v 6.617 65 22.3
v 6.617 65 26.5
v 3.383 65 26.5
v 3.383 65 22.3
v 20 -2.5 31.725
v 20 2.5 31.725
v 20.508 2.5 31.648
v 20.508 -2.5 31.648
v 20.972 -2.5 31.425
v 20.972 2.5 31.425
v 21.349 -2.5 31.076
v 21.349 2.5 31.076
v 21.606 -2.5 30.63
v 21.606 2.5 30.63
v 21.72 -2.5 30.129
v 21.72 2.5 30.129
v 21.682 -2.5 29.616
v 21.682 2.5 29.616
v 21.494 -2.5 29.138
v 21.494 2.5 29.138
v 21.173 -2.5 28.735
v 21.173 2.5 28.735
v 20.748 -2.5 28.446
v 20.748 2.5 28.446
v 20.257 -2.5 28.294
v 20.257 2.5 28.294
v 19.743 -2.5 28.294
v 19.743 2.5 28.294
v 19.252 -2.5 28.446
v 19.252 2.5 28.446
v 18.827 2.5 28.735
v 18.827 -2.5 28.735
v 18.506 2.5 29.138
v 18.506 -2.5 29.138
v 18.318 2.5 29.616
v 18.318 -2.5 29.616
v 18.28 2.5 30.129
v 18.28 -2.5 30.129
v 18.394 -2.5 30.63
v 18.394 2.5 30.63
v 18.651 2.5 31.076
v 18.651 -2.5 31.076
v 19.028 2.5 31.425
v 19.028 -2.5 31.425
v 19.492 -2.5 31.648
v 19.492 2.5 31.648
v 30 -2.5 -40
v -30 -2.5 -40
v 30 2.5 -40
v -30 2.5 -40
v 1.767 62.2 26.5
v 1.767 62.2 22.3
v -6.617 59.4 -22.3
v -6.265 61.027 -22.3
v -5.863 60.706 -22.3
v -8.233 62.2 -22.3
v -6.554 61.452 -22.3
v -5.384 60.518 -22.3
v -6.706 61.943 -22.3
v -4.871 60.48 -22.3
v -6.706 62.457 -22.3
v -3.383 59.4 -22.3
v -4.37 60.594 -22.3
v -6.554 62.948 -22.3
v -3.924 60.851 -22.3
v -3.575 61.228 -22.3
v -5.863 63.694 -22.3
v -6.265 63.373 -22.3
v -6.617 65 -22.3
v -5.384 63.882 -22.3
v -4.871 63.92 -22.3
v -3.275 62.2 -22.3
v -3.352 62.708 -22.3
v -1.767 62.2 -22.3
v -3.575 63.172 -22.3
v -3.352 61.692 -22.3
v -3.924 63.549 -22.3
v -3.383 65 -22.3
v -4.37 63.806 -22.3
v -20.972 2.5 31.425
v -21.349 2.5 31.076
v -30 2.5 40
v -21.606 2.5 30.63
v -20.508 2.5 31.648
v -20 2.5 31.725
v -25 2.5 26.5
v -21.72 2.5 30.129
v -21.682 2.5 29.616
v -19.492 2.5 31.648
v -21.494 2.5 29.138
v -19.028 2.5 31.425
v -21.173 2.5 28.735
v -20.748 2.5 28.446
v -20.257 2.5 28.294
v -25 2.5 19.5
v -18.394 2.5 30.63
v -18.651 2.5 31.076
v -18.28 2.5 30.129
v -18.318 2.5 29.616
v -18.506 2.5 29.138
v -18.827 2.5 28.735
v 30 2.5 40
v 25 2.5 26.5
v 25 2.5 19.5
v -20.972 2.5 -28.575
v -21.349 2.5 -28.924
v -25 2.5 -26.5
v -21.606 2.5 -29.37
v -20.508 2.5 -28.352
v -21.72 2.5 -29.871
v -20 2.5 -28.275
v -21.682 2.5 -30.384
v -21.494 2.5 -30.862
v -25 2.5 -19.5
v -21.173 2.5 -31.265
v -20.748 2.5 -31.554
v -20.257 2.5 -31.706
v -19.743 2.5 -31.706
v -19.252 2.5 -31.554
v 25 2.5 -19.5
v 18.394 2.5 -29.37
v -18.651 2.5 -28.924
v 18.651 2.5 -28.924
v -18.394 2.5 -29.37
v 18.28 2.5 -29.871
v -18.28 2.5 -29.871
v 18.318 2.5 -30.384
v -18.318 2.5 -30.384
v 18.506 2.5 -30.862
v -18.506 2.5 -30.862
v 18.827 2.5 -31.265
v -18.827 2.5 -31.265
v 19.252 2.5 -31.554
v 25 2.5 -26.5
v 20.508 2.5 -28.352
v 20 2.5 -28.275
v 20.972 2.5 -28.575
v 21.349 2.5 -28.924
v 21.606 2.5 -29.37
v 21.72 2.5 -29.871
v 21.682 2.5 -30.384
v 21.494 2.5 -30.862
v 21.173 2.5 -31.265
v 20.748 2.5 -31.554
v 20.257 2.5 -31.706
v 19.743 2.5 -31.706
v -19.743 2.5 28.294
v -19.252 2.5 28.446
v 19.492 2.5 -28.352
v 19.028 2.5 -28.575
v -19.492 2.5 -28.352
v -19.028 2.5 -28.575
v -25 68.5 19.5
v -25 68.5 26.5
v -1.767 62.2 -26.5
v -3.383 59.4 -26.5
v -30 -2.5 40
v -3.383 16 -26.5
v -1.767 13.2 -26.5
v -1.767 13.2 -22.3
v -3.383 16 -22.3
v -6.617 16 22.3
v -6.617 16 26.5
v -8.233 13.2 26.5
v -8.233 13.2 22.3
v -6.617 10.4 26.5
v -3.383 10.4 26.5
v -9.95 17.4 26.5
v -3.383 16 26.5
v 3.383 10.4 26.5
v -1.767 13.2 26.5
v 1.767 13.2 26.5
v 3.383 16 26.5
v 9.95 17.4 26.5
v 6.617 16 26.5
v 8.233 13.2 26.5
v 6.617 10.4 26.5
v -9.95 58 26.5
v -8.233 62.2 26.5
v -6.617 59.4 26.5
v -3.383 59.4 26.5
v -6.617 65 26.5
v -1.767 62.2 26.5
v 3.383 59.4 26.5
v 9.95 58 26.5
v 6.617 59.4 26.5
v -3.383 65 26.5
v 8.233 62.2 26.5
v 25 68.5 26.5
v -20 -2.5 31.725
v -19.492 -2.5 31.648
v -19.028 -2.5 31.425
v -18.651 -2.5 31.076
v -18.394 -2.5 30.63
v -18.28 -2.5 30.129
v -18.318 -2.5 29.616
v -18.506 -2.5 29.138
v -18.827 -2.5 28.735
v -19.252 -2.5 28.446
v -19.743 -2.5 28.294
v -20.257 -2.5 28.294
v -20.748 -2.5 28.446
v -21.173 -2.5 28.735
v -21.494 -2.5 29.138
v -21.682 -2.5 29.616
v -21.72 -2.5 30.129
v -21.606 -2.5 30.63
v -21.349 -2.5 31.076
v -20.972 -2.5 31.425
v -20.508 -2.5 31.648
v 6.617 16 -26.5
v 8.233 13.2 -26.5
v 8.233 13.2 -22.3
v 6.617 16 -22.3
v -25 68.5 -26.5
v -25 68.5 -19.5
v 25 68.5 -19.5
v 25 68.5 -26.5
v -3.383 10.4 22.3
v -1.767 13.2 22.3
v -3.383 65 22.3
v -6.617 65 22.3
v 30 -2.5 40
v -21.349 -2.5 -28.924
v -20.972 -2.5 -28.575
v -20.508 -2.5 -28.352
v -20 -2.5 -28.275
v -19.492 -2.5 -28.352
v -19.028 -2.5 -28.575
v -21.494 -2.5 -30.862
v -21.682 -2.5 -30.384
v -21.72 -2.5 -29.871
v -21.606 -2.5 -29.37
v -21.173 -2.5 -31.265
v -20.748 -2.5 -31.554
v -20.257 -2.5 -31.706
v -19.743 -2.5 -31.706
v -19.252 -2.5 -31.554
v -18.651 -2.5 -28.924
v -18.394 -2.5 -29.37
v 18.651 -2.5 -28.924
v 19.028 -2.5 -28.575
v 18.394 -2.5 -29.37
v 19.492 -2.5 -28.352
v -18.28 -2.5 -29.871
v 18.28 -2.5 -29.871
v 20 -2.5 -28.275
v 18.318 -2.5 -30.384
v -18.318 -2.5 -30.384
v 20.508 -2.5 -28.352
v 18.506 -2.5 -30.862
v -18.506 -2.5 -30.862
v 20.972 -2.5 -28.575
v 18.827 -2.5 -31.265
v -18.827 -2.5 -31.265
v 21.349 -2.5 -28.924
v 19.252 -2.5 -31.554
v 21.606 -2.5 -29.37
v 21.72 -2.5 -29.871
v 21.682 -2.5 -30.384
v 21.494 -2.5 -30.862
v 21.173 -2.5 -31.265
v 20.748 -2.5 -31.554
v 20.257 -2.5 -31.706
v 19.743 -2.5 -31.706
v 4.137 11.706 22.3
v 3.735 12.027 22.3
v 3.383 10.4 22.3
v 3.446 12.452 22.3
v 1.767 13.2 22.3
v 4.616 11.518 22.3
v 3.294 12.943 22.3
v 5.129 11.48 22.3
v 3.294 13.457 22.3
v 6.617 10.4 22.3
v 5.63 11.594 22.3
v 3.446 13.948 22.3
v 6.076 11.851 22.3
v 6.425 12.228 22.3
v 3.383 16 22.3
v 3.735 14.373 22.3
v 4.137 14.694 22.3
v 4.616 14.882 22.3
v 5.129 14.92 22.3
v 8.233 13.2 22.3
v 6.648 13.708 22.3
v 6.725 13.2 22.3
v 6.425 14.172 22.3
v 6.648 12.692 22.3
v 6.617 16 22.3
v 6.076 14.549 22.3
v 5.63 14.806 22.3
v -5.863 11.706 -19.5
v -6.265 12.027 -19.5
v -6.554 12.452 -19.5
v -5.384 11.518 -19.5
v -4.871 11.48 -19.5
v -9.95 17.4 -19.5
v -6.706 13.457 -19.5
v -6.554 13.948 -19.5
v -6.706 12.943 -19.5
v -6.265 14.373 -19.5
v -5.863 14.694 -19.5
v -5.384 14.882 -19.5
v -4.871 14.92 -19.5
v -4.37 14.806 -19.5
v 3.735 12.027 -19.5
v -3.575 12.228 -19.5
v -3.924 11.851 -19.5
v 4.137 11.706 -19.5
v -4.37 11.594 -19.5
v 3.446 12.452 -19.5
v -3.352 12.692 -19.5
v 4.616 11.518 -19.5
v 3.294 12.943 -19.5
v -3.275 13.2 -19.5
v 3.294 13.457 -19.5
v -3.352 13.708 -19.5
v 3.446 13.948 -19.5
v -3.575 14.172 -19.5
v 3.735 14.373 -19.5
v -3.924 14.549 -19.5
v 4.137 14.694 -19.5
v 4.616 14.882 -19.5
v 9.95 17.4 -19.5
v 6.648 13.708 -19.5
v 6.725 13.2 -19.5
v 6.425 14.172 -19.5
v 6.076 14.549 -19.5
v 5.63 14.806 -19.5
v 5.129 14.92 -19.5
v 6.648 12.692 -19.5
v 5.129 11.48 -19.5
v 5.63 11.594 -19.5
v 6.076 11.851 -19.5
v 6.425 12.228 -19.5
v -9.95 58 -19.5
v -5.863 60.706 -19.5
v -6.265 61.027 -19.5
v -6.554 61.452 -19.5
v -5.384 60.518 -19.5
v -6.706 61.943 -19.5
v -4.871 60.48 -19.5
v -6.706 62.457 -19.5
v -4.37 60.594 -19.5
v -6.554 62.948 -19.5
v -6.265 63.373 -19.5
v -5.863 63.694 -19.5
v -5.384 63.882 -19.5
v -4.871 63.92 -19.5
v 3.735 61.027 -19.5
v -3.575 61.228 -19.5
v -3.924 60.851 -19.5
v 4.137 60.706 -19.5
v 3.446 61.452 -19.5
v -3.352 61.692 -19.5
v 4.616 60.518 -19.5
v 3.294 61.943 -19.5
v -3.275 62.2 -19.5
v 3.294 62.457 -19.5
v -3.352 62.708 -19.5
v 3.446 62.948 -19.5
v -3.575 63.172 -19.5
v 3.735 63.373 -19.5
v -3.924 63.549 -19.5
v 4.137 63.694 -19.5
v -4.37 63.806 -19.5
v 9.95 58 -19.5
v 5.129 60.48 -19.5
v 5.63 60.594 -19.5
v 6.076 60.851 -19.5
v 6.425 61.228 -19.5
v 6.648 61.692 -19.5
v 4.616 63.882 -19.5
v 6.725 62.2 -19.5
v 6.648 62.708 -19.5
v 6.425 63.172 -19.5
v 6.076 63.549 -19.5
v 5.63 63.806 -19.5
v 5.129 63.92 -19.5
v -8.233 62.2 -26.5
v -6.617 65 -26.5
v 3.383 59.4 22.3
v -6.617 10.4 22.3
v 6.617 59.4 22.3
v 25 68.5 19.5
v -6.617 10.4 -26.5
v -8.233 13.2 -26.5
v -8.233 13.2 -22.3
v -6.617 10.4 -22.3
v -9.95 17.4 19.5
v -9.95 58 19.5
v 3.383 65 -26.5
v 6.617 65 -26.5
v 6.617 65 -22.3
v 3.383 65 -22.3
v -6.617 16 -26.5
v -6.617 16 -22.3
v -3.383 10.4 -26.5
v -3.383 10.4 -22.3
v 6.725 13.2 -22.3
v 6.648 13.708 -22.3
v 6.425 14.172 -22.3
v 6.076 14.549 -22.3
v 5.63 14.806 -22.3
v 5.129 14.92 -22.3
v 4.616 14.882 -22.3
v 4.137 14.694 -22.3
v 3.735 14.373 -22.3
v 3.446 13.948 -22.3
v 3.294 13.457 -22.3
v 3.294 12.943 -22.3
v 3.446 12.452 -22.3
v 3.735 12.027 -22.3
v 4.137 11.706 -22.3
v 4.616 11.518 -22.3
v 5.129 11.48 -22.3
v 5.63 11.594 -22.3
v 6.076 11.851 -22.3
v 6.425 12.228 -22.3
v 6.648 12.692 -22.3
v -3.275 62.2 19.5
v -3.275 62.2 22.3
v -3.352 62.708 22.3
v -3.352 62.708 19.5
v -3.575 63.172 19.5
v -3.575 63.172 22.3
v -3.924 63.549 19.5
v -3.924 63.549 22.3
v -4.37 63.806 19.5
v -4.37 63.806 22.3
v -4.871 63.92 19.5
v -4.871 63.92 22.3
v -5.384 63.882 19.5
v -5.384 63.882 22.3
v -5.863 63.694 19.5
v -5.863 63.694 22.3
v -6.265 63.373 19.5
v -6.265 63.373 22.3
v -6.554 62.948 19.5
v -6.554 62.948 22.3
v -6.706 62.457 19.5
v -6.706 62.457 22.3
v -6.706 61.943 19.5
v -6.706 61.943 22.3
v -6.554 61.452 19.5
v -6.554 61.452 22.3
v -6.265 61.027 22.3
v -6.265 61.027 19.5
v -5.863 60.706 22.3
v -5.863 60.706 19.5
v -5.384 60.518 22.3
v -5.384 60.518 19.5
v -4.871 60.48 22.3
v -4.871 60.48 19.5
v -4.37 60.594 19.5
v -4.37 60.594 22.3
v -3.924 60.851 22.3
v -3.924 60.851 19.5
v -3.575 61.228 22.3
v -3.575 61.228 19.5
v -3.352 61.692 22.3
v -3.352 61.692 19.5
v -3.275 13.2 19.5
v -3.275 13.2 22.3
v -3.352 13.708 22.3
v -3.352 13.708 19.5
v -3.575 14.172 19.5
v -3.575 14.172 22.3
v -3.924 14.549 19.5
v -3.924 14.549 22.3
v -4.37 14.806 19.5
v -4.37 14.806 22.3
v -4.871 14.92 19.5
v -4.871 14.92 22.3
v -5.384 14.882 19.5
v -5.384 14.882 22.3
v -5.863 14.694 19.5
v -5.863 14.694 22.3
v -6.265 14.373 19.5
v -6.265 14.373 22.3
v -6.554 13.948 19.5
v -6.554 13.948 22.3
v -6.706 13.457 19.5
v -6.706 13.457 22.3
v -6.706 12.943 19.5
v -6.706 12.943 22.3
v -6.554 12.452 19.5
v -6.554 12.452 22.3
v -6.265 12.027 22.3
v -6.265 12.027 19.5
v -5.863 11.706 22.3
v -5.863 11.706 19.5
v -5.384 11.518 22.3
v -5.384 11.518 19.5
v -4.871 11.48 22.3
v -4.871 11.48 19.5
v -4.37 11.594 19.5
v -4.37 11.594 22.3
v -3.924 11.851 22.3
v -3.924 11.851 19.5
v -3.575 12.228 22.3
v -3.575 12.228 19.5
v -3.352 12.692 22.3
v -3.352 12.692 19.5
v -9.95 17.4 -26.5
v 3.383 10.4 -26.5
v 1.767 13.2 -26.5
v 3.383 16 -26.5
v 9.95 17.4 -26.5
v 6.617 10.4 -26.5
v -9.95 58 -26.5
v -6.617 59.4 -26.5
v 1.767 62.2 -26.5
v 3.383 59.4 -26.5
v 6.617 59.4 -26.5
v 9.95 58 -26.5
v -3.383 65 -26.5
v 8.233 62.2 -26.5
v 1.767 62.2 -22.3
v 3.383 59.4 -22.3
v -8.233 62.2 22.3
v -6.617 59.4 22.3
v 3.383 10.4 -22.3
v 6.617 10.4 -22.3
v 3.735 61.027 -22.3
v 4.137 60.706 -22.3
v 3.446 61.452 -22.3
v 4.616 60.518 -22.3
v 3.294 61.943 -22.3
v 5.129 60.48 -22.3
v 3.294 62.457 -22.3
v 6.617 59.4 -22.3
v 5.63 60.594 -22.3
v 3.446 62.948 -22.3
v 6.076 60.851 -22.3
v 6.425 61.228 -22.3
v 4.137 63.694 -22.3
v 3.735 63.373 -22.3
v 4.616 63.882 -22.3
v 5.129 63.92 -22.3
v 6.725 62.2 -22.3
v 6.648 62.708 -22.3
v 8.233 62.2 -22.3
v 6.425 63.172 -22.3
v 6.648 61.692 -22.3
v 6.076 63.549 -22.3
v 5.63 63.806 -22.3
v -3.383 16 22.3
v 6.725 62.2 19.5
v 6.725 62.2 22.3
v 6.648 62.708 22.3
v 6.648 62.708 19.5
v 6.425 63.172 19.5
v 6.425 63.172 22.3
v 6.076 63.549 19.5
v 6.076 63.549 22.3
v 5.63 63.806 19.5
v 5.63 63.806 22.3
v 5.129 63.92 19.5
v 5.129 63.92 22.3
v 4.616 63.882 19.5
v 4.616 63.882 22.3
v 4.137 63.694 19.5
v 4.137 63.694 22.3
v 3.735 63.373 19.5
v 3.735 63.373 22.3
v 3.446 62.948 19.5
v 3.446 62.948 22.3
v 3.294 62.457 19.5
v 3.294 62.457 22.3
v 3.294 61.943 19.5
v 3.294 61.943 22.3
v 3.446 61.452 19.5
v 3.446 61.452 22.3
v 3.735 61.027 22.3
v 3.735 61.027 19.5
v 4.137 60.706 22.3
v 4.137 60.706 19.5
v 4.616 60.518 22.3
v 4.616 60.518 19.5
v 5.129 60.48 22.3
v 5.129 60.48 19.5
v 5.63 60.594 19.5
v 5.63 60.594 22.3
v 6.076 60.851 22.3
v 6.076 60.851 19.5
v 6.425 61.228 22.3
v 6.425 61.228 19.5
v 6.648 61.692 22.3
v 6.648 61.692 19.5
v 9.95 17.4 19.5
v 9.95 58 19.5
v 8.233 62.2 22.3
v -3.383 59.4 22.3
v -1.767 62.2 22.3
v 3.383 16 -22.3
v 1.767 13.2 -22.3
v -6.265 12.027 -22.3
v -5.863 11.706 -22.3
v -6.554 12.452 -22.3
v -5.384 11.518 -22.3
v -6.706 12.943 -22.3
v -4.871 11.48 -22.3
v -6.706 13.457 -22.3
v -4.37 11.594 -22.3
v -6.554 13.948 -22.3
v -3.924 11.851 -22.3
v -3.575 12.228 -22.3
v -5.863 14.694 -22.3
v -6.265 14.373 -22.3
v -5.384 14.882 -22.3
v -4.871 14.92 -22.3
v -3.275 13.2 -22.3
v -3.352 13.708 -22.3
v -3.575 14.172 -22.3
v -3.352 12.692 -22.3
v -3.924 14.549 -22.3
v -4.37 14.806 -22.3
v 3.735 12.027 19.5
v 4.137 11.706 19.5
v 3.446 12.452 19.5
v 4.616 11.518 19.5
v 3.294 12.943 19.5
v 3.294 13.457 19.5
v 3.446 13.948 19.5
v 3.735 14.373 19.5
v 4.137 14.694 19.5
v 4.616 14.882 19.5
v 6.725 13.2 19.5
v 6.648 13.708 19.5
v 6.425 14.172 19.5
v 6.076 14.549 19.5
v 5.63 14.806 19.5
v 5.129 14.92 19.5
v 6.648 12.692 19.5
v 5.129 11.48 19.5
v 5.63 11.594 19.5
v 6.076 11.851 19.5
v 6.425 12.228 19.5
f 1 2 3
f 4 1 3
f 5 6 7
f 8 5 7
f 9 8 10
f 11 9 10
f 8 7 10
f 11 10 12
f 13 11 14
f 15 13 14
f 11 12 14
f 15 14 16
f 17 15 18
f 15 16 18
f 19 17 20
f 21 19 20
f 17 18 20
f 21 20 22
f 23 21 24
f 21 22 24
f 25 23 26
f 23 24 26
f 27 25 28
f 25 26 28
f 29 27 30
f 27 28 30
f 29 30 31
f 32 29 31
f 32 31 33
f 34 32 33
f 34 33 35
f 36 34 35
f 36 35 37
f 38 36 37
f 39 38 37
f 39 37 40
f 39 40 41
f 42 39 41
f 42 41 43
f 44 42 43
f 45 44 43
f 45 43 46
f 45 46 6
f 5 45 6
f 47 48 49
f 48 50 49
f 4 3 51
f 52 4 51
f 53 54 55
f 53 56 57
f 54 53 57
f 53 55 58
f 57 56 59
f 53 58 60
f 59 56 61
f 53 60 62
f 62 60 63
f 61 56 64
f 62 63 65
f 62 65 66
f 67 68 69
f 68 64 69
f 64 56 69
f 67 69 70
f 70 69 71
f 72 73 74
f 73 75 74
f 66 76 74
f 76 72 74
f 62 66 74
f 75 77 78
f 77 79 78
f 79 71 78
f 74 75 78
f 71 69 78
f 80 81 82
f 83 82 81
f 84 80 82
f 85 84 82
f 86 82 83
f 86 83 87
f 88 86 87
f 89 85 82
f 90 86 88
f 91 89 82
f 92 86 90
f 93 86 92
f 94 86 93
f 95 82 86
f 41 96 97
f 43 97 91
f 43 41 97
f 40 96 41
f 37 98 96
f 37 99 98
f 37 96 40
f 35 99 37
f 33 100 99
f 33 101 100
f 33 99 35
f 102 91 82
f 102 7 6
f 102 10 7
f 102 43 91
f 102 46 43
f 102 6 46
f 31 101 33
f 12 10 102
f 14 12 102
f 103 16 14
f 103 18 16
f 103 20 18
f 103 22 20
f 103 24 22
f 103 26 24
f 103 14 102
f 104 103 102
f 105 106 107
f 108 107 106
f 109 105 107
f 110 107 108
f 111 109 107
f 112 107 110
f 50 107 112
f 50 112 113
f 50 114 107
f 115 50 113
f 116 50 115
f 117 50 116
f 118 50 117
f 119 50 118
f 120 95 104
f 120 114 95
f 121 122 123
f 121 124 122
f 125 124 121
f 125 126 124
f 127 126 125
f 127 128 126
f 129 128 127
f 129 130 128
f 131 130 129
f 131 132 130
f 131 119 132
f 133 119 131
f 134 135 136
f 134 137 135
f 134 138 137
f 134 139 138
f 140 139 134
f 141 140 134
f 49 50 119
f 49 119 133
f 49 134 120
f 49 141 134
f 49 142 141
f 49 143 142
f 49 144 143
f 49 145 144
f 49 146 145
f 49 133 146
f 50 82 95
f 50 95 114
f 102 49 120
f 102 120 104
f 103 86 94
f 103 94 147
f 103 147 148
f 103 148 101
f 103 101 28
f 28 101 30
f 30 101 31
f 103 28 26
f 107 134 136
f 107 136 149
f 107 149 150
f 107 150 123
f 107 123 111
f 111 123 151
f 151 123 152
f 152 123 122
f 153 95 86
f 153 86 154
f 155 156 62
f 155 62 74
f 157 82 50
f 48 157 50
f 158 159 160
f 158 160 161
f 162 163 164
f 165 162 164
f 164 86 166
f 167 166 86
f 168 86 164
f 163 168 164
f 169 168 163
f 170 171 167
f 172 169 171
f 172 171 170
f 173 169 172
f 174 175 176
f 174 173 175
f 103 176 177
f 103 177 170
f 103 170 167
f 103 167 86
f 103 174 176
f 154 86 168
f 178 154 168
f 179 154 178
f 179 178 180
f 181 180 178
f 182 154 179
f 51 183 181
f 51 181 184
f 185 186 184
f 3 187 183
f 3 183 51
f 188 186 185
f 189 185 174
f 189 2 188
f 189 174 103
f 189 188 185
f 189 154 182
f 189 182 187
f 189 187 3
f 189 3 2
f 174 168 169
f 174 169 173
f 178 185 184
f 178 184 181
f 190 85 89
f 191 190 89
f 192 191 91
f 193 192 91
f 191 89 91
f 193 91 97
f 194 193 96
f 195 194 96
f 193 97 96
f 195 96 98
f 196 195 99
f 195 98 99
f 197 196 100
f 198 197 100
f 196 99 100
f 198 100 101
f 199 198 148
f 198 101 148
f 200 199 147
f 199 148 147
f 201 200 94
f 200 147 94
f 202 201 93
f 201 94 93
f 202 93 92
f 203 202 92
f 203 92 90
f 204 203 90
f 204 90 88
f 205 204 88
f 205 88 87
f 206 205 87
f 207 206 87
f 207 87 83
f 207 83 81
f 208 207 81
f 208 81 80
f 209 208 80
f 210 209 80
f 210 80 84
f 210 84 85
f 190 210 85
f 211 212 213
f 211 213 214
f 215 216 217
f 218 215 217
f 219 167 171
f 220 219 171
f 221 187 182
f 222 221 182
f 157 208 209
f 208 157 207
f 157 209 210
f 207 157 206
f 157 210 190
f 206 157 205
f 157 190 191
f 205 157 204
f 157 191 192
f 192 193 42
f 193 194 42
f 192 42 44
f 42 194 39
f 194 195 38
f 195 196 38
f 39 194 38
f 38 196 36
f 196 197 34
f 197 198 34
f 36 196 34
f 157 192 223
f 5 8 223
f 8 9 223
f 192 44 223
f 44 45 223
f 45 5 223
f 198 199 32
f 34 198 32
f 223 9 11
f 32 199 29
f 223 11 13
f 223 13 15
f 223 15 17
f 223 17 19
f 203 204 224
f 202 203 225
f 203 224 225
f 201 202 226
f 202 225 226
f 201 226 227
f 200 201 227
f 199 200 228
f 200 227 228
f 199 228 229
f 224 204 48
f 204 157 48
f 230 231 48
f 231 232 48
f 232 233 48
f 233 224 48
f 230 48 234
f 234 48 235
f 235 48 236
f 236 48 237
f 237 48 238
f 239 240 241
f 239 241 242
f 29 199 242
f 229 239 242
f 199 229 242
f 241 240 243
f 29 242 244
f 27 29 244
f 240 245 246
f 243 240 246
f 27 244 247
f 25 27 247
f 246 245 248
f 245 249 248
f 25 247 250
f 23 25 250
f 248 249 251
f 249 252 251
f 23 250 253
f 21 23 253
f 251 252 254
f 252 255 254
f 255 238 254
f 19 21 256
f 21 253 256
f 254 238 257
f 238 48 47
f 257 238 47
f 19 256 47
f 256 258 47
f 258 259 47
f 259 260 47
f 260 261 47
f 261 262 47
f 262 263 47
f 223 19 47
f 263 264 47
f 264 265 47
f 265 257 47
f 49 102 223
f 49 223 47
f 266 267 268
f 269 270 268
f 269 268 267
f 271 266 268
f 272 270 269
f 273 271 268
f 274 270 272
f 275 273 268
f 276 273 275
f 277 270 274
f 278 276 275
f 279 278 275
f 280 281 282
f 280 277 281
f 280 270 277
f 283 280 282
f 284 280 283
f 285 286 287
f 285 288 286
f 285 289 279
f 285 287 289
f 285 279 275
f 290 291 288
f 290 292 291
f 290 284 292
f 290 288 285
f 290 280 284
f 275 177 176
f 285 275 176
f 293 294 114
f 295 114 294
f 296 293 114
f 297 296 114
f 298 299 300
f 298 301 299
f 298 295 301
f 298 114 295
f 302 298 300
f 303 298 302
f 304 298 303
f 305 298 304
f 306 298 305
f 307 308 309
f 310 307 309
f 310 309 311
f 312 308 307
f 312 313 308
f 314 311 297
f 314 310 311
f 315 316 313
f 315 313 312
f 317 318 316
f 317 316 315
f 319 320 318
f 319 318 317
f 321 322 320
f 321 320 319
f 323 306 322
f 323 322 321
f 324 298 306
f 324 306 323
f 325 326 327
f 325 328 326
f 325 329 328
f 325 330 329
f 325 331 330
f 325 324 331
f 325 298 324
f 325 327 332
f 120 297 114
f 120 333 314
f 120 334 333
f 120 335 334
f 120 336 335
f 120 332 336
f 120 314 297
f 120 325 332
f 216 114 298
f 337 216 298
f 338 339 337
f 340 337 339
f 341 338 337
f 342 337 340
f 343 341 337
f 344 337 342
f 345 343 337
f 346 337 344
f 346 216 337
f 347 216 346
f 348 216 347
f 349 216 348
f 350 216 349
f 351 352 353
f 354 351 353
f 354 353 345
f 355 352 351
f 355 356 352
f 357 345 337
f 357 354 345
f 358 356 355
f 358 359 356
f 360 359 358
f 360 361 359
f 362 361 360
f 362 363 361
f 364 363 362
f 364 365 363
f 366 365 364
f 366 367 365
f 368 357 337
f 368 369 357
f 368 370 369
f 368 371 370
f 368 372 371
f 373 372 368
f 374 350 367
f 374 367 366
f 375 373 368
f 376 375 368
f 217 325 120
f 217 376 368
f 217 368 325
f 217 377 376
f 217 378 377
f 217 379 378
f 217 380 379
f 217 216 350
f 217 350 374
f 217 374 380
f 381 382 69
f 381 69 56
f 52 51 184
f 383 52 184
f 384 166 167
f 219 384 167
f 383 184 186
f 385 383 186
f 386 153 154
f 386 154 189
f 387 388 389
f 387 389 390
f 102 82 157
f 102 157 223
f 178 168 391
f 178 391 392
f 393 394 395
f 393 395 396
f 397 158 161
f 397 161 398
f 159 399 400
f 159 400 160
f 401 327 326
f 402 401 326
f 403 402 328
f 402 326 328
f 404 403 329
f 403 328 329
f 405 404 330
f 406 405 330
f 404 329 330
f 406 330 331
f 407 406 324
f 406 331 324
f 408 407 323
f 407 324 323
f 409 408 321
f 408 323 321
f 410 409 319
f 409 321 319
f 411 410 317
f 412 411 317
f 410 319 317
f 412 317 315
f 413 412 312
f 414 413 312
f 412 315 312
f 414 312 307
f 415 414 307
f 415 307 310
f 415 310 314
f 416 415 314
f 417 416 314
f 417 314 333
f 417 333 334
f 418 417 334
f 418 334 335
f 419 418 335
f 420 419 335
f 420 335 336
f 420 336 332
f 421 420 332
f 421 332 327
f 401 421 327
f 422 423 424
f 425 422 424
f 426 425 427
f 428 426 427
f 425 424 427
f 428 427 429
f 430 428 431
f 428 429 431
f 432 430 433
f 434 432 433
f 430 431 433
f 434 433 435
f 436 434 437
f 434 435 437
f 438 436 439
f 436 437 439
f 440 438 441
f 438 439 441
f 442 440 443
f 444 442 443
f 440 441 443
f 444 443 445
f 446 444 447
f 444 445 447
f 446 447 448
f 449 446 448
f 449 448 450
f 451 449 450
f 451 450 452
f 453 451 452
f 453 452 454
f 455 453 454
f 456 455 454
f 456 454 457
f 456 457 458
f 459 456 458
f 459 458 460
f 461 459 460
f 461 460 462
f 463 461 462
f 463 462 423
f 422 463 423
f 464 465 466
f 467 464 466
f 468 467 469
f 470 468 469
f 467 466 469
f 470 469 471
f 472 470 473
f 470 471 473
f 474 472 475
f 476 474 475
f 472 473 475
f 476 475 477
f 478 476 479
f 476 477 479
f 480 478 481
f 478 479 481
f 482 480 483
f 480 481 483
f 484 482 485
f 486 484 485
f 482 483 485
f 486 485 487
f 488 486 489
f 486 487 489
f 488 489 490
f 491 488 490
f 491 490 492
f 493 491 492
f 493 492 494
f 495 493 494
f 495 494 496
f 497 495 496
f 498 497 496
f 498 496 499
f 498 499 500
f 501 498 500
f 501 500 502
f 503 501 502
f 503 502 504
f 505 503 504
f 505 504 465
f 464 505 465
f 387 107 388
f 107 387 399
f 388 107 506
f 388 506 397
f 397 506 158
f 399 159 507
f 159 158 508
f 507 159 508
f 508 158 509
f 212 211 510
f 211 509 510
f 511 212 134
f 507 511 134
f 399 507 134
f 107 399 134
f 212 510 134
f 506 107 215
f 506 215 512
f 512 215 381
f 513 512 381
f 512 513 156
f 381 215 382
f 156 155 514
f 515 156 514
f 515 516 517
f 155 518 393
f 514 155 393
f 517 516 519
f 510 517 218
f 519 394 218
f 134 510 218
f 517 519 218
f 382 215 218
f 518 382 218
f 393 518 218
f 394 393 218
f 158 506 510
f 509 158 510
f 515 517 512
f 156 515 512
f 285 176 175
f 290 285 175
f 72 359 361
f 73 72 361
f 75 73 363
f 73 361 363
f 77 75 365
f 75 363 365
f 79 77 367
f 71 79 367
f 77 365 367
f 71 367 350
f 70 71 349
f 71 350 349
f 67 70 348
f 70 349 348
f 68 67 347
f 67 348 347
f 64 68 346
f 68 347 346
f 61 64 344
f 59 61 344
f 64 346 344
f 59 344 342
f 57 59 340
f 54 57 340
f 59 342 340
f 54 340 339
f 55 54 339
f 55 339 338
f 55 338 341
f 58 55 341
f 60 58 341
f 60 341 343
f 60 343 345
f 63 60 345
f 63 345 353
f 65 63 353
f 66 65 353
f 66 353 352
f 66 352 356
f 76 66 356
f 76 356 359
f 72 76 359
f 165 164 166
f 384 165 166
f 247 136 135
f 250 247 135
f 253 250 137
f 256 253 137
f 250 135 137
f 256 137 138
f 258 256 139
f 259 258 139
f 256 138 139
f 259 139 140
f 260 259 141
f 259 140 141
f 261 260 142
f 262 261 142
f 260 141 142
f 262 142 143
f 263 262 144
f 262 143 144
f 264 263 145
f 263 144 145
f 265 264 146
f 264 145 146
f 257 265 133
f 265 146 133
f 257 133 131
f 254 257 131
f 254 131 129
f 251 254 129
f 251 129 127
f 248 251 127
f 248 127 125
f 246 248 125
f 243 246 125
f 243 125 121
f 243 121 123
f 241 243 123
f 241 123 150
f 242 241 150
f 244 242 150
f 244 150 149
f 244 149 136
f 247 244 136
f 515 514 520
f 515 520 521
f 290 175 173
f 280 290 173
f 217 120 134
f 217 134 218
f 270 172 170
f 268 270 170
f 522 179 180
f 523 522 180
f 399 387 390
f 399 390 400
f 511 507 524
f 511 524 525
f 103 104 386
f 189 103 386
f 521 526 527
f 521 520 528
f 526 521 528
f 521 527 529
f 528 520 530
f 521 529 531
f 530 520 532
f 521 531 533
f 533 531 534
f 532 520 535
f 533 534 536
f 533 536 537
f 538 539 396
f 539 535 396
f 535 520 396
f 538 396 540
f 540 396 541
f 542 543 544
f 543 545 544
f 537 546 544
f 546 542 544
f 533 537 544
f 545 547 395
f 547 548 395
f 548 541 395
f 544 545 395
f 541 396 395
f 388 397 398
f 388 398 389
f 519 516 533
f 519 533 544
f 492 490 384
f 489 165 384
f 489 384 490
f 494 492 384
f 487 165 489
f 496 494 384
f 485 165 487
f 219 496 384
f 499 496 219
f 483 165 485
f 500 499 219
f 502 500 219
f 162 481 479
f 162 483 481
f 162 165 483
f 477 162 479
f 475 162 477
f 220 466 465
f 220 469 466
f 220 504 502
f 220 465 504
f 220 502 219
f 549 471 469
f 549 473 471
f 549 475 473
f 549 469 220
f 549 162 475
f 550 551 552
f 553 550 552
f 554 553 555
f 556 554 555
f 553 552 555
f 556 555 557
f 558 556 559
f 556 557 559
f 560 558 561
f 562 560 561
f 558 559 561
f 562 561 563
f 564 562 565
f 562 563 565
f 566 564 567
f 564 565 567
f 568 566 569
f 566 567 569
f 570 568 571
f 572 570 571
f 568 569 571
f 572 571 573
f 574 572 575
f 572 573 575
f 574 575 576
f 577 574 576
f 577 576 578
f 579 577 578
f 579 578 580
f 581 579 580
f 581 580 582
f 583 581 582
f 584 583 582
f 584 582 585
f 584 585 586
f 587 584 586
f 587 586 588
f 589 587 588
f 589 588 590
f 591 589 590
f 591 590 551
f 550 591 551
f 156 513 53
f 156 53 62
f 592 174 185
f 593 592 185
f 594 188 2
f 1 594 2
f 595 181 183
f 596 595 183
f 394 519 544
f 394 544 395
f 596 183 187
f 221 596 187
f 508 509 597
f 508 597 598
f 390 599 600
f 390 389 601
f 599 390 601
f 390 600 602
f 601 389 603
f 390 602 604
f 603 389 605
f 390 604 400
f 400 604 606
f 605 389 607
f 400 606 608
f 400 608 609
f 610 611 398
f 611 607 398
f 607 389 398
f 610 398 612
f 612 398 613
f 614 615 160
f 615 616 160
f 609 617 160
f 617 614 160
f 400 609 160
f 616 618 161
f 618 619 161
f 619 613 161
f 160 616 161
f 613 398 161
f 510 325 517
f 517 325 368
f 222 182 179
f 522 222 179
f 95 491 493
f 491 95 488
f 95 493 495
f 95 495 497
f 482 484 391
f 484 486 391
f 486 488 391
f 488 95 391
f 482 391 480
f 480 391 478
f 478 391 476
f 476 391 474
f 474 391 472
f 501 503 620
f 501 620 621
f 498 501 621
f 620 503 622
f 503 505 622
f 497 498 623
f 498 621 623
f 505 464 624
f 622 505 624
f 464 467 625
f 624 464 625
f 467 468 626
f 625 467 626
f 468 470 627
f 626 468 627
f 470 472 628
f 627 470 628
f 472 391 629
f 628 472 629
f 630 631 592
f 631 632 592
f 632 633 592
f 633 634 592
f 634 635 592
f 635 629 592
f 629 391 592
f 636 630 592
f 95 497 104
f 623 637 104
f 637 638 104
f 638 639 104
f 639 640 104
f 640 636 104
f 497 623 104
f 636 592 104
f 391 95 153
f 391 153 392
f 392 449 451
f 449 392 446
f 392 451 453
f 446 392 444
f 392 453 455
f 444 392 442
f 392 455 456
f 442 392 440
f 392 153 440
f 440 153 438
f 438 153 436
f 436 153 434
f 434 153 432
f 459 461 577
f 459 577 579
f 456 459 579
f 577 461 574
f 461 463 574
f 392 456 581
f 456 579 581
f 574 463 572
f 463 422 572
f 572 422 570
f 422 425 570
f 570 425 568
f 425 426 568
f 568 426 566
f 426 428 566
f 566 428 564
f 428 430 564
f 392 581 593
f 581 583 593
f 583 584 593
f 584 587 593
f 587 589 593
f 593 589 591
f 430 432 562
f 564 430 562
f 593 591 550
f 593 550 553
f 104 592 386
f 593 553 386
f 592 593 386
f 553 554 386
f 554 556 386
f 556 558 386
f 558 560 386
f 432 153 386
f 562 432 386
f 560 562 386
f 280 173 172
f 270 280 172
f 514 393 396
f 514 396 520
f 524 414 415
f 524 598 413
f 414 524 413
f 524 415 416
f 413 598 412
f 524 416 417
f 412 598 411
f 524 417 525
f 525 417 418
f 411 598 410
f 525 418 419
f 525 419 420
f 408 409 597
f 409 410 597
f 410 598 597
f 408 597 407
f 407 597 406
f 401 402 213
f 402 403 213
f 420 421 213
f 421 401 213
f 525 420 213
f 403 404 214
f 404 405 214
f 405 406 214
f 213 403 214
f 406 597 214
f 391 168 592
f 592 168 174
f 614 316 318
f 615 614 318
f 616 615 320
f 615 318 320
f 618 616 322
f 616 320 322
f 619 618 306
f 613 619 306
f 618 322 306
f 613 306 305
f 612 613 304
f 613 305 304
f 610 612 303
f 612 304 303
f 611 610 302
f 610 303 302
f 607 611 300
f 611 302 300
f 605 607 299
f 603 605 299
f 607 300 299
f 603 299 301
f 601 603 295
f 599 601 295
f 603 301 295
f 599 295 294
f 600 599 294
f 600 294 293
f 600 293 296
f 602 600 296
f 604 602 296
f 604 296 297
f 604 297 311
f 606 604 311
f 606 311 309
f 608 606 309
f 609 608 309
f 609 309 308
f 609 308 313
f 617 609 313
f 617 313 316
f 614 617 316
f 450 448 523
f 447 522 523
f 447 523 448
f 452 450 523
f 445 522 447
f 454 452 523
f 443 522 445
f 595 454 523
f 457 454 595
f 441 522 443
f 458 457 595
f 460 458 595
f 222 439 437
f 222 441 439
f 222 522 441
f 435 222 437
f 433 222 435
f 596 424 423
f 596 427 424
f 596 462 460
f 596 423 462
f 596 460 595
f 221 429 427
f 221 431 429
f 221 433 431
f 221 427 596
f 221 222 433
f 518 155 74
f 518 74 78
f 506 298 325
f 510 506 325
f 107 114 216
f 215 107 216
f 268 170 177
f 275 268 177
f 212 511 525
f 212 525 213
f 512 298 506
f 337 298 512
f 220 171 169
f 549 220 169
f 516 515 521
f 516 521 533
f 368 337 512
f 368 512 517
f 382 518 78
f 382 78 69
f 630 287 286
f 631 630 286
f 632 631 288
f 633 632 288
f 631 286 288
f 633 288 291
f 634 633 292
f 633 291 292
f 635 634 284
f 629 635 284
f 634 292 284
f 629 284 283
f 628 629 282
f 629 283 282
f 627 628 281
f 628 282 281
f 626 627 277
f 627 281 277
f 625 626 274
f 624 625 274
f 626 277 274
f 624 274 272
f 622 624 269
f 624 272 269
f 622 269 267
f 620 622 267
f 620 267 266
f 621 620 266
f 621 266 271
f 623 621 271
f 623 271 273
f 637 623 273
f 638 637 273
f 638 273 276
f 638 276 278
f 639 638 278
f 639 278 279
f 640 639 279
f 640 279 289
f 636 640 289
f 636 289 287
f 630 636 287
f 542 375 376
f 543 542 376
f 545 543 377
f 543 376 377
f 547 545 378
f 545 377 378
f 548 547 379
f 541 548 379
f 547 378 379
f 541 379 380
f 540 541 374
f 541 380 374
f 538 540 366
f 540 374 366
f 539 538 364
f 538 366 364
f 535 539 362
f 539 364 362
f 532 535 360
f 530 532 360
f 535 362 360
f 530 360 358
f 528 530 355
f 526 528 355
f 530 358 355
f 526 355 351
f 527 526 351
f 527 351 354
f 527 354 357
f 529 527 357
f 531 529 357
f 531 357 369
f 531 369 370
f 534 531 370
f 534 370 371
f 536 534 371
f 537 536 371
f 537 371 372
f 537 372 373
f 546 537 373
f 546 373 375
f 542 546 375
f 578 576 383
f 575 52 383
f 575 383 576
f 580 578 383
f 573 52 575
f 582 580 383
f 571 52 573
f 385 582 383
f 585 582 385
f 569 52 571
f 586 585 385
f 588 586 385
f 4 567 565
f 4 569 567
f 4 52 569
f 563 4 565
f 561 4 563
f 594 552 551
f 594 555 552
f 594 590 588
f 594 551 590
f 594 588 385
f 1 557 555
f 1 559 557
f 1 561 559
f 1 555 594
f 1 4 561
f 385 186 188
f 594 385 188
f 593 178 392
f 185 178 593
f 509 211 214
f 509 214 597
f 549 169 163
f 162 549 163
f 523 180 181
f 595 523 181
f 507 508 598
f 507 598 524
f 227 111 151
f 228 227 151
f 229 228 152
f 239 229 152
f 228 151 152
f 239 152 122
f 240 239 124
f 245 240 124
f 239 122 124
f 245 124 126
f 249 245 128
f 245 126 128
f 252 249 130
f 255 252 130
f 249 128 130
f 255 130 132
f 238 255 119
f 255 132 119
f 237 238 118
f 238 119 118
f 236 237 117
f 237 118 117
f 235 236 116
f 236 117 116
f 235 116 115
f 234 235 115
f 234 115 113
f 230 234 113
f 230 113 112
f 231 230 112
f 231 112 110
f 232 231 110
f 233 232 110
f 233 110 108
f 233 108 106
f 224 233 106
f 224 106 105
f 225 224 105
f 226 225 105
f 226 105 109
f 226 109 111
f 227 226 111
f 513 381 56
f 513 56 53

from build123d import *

# Parameters (mm, degrees)
SKETCH1_W           = 60
SKETCH1_H           = 80
BOSS_EXTRUDE1_DEPTH = 2.5
SKETCH2_R           = 1.725
CUT_EXTRUDE1_DEPTH  = 51.249378106
SKETCH3_W           = 50
SKETCH3_H           = 66
BOSS_EXTRUDE2_DEPTH = 7
SKETCH4_W           = 19.9
SKETCH4_H           = 40.6
CUT_EXTRUDE2_DEPTH  = 101.072473738
SKETCH5_R           = 1.725
CUT_EXTRUDE3_DEPTH  = 101.072473738
CUT_EXTRUDE4_DEPTH  = 4.2


with BuildPart() as part:
    # Sketch1 → Boss-Extrude1 (new, symmetric)
    with BuildSketch(Plane(origin=(0, 0, 0), x_dir=(1, 0, 0), z_dir=(0, 1, 0))):
        Rectangle(SKETCH1_W, SKETCH1_H)
    extrude(amount=BOSS_EXTRUDE1_DEPTH, both=True)

    # Sketch2 → Cut-Extrude1 (cut, through all)
    with BuildSketch(Plane(origin=(0, 2.5, 0), x_dir=(1, 0, 0), z_dir=(0, 1, 0))):
        with Locations(Location((-20, 30, 0), (0, 0, 270))):
            Circle(SKETCH2_R)
        with Locations(Location((20, 30, 0), (0, 0, 270))):
            Circle(SKETCH2_R)
        with Locations(Location((20, -30, 0), (0, 0, 270))):
            Circle(SKETCH2_R)
        with Locations(Location((-20, -30, 0), (0, 0, 270))):
            Circle(SKETCH2_R)
    extrude(amount=-CUT_EXTRUDE1_DEPTH, mode=Mode.SUBTRACT)

    # Sketch3 → Boss-Extrude2 (add)
    with BuildSketch(Plane.XY.offset(19.5)):
        with Locations((0, 35.5)):
            Rectangle(SKETCH3_W, SKETCH3_H)
    boss_extrude2 = extrude(amount=BOSS_EXTRUDE2_DEPTH)

    # Mirror1: Boss-Extrude2 across plane
    add(boss_extrude2.mirror(Plane.XY))

    # Sketch4 → Cut-Extrude2 (cut, through all)
    with BuildSketch(Plane.XY.offset(26.5)):
        with Locations((0, 37.7)):
            Rectangle(SKETCH4_W, SKETCH4_H)
    extrude(amount=-CUT_EXTRUDE2_DEPTH, mode=Mode.SUBTRACT)

    # Sketch5 → Cut-Extrude3 (cut, through all)
    with BuildSketch(Plane.XY.offset(26.5)):
        with Locations((-5, 62.2)):
            Circle(SKETCH5_R)
        with Locations((5, 62.2)):
            Circle(SKETCH5_R)
        with Locations((-5, 13.2)):
            Circle(SKETCH5_R)
        with Locations((5, 13.2)):
            Circle(SKETCH5_R)
    extrude(amount=-CUT_EXTRUDE3_DEPTH, mode=Mode.SUBTRACT)

    # Sketch6 → Cut-Extrude4 (cut)
    with BuildSketch(Plane.XY.offset(26.5)):
        Polygon((-1.766838493, 62.2), (-3.383419246, 65), (-6.616580754, 65), (-8.233161507, 62.2), (-6.616580754, 59.4), (-3.383419246, 59.4), align=None)
        Polygon((1.766838493, 62.2), (3.383419246, 59.4), (6.616580754, 59.4), (8.233161507, 62.2), (6.616580754, 65), (3.383419246, 65), align=None)
        Polygon((-1.766838493, 13.2), (-3.383419246, 16), (-6.616580754, 16), (-8.233161507, 13.2), (-6.616580754, 10.4), (-3.383419246, 10.4), align=None)
        Polygon((8.233161507, 13.2), (6.616580754, 16), (3.383419246, 16), (1.766838493, 13.2), (3.383419246, 10.4), (6.616580754, 10.4), align=None)
    cut_extrude4 = extrude(amount=-CUT_EXTRUDE4_DEPTH, mode=Mode.SUBTRACT)

    # Mirror3: Cut-Extrude4 across plane
    add(cut_extrude4.mirror(Plane.XY), mode=Mode.SUBTRACT)


solid = part.part
